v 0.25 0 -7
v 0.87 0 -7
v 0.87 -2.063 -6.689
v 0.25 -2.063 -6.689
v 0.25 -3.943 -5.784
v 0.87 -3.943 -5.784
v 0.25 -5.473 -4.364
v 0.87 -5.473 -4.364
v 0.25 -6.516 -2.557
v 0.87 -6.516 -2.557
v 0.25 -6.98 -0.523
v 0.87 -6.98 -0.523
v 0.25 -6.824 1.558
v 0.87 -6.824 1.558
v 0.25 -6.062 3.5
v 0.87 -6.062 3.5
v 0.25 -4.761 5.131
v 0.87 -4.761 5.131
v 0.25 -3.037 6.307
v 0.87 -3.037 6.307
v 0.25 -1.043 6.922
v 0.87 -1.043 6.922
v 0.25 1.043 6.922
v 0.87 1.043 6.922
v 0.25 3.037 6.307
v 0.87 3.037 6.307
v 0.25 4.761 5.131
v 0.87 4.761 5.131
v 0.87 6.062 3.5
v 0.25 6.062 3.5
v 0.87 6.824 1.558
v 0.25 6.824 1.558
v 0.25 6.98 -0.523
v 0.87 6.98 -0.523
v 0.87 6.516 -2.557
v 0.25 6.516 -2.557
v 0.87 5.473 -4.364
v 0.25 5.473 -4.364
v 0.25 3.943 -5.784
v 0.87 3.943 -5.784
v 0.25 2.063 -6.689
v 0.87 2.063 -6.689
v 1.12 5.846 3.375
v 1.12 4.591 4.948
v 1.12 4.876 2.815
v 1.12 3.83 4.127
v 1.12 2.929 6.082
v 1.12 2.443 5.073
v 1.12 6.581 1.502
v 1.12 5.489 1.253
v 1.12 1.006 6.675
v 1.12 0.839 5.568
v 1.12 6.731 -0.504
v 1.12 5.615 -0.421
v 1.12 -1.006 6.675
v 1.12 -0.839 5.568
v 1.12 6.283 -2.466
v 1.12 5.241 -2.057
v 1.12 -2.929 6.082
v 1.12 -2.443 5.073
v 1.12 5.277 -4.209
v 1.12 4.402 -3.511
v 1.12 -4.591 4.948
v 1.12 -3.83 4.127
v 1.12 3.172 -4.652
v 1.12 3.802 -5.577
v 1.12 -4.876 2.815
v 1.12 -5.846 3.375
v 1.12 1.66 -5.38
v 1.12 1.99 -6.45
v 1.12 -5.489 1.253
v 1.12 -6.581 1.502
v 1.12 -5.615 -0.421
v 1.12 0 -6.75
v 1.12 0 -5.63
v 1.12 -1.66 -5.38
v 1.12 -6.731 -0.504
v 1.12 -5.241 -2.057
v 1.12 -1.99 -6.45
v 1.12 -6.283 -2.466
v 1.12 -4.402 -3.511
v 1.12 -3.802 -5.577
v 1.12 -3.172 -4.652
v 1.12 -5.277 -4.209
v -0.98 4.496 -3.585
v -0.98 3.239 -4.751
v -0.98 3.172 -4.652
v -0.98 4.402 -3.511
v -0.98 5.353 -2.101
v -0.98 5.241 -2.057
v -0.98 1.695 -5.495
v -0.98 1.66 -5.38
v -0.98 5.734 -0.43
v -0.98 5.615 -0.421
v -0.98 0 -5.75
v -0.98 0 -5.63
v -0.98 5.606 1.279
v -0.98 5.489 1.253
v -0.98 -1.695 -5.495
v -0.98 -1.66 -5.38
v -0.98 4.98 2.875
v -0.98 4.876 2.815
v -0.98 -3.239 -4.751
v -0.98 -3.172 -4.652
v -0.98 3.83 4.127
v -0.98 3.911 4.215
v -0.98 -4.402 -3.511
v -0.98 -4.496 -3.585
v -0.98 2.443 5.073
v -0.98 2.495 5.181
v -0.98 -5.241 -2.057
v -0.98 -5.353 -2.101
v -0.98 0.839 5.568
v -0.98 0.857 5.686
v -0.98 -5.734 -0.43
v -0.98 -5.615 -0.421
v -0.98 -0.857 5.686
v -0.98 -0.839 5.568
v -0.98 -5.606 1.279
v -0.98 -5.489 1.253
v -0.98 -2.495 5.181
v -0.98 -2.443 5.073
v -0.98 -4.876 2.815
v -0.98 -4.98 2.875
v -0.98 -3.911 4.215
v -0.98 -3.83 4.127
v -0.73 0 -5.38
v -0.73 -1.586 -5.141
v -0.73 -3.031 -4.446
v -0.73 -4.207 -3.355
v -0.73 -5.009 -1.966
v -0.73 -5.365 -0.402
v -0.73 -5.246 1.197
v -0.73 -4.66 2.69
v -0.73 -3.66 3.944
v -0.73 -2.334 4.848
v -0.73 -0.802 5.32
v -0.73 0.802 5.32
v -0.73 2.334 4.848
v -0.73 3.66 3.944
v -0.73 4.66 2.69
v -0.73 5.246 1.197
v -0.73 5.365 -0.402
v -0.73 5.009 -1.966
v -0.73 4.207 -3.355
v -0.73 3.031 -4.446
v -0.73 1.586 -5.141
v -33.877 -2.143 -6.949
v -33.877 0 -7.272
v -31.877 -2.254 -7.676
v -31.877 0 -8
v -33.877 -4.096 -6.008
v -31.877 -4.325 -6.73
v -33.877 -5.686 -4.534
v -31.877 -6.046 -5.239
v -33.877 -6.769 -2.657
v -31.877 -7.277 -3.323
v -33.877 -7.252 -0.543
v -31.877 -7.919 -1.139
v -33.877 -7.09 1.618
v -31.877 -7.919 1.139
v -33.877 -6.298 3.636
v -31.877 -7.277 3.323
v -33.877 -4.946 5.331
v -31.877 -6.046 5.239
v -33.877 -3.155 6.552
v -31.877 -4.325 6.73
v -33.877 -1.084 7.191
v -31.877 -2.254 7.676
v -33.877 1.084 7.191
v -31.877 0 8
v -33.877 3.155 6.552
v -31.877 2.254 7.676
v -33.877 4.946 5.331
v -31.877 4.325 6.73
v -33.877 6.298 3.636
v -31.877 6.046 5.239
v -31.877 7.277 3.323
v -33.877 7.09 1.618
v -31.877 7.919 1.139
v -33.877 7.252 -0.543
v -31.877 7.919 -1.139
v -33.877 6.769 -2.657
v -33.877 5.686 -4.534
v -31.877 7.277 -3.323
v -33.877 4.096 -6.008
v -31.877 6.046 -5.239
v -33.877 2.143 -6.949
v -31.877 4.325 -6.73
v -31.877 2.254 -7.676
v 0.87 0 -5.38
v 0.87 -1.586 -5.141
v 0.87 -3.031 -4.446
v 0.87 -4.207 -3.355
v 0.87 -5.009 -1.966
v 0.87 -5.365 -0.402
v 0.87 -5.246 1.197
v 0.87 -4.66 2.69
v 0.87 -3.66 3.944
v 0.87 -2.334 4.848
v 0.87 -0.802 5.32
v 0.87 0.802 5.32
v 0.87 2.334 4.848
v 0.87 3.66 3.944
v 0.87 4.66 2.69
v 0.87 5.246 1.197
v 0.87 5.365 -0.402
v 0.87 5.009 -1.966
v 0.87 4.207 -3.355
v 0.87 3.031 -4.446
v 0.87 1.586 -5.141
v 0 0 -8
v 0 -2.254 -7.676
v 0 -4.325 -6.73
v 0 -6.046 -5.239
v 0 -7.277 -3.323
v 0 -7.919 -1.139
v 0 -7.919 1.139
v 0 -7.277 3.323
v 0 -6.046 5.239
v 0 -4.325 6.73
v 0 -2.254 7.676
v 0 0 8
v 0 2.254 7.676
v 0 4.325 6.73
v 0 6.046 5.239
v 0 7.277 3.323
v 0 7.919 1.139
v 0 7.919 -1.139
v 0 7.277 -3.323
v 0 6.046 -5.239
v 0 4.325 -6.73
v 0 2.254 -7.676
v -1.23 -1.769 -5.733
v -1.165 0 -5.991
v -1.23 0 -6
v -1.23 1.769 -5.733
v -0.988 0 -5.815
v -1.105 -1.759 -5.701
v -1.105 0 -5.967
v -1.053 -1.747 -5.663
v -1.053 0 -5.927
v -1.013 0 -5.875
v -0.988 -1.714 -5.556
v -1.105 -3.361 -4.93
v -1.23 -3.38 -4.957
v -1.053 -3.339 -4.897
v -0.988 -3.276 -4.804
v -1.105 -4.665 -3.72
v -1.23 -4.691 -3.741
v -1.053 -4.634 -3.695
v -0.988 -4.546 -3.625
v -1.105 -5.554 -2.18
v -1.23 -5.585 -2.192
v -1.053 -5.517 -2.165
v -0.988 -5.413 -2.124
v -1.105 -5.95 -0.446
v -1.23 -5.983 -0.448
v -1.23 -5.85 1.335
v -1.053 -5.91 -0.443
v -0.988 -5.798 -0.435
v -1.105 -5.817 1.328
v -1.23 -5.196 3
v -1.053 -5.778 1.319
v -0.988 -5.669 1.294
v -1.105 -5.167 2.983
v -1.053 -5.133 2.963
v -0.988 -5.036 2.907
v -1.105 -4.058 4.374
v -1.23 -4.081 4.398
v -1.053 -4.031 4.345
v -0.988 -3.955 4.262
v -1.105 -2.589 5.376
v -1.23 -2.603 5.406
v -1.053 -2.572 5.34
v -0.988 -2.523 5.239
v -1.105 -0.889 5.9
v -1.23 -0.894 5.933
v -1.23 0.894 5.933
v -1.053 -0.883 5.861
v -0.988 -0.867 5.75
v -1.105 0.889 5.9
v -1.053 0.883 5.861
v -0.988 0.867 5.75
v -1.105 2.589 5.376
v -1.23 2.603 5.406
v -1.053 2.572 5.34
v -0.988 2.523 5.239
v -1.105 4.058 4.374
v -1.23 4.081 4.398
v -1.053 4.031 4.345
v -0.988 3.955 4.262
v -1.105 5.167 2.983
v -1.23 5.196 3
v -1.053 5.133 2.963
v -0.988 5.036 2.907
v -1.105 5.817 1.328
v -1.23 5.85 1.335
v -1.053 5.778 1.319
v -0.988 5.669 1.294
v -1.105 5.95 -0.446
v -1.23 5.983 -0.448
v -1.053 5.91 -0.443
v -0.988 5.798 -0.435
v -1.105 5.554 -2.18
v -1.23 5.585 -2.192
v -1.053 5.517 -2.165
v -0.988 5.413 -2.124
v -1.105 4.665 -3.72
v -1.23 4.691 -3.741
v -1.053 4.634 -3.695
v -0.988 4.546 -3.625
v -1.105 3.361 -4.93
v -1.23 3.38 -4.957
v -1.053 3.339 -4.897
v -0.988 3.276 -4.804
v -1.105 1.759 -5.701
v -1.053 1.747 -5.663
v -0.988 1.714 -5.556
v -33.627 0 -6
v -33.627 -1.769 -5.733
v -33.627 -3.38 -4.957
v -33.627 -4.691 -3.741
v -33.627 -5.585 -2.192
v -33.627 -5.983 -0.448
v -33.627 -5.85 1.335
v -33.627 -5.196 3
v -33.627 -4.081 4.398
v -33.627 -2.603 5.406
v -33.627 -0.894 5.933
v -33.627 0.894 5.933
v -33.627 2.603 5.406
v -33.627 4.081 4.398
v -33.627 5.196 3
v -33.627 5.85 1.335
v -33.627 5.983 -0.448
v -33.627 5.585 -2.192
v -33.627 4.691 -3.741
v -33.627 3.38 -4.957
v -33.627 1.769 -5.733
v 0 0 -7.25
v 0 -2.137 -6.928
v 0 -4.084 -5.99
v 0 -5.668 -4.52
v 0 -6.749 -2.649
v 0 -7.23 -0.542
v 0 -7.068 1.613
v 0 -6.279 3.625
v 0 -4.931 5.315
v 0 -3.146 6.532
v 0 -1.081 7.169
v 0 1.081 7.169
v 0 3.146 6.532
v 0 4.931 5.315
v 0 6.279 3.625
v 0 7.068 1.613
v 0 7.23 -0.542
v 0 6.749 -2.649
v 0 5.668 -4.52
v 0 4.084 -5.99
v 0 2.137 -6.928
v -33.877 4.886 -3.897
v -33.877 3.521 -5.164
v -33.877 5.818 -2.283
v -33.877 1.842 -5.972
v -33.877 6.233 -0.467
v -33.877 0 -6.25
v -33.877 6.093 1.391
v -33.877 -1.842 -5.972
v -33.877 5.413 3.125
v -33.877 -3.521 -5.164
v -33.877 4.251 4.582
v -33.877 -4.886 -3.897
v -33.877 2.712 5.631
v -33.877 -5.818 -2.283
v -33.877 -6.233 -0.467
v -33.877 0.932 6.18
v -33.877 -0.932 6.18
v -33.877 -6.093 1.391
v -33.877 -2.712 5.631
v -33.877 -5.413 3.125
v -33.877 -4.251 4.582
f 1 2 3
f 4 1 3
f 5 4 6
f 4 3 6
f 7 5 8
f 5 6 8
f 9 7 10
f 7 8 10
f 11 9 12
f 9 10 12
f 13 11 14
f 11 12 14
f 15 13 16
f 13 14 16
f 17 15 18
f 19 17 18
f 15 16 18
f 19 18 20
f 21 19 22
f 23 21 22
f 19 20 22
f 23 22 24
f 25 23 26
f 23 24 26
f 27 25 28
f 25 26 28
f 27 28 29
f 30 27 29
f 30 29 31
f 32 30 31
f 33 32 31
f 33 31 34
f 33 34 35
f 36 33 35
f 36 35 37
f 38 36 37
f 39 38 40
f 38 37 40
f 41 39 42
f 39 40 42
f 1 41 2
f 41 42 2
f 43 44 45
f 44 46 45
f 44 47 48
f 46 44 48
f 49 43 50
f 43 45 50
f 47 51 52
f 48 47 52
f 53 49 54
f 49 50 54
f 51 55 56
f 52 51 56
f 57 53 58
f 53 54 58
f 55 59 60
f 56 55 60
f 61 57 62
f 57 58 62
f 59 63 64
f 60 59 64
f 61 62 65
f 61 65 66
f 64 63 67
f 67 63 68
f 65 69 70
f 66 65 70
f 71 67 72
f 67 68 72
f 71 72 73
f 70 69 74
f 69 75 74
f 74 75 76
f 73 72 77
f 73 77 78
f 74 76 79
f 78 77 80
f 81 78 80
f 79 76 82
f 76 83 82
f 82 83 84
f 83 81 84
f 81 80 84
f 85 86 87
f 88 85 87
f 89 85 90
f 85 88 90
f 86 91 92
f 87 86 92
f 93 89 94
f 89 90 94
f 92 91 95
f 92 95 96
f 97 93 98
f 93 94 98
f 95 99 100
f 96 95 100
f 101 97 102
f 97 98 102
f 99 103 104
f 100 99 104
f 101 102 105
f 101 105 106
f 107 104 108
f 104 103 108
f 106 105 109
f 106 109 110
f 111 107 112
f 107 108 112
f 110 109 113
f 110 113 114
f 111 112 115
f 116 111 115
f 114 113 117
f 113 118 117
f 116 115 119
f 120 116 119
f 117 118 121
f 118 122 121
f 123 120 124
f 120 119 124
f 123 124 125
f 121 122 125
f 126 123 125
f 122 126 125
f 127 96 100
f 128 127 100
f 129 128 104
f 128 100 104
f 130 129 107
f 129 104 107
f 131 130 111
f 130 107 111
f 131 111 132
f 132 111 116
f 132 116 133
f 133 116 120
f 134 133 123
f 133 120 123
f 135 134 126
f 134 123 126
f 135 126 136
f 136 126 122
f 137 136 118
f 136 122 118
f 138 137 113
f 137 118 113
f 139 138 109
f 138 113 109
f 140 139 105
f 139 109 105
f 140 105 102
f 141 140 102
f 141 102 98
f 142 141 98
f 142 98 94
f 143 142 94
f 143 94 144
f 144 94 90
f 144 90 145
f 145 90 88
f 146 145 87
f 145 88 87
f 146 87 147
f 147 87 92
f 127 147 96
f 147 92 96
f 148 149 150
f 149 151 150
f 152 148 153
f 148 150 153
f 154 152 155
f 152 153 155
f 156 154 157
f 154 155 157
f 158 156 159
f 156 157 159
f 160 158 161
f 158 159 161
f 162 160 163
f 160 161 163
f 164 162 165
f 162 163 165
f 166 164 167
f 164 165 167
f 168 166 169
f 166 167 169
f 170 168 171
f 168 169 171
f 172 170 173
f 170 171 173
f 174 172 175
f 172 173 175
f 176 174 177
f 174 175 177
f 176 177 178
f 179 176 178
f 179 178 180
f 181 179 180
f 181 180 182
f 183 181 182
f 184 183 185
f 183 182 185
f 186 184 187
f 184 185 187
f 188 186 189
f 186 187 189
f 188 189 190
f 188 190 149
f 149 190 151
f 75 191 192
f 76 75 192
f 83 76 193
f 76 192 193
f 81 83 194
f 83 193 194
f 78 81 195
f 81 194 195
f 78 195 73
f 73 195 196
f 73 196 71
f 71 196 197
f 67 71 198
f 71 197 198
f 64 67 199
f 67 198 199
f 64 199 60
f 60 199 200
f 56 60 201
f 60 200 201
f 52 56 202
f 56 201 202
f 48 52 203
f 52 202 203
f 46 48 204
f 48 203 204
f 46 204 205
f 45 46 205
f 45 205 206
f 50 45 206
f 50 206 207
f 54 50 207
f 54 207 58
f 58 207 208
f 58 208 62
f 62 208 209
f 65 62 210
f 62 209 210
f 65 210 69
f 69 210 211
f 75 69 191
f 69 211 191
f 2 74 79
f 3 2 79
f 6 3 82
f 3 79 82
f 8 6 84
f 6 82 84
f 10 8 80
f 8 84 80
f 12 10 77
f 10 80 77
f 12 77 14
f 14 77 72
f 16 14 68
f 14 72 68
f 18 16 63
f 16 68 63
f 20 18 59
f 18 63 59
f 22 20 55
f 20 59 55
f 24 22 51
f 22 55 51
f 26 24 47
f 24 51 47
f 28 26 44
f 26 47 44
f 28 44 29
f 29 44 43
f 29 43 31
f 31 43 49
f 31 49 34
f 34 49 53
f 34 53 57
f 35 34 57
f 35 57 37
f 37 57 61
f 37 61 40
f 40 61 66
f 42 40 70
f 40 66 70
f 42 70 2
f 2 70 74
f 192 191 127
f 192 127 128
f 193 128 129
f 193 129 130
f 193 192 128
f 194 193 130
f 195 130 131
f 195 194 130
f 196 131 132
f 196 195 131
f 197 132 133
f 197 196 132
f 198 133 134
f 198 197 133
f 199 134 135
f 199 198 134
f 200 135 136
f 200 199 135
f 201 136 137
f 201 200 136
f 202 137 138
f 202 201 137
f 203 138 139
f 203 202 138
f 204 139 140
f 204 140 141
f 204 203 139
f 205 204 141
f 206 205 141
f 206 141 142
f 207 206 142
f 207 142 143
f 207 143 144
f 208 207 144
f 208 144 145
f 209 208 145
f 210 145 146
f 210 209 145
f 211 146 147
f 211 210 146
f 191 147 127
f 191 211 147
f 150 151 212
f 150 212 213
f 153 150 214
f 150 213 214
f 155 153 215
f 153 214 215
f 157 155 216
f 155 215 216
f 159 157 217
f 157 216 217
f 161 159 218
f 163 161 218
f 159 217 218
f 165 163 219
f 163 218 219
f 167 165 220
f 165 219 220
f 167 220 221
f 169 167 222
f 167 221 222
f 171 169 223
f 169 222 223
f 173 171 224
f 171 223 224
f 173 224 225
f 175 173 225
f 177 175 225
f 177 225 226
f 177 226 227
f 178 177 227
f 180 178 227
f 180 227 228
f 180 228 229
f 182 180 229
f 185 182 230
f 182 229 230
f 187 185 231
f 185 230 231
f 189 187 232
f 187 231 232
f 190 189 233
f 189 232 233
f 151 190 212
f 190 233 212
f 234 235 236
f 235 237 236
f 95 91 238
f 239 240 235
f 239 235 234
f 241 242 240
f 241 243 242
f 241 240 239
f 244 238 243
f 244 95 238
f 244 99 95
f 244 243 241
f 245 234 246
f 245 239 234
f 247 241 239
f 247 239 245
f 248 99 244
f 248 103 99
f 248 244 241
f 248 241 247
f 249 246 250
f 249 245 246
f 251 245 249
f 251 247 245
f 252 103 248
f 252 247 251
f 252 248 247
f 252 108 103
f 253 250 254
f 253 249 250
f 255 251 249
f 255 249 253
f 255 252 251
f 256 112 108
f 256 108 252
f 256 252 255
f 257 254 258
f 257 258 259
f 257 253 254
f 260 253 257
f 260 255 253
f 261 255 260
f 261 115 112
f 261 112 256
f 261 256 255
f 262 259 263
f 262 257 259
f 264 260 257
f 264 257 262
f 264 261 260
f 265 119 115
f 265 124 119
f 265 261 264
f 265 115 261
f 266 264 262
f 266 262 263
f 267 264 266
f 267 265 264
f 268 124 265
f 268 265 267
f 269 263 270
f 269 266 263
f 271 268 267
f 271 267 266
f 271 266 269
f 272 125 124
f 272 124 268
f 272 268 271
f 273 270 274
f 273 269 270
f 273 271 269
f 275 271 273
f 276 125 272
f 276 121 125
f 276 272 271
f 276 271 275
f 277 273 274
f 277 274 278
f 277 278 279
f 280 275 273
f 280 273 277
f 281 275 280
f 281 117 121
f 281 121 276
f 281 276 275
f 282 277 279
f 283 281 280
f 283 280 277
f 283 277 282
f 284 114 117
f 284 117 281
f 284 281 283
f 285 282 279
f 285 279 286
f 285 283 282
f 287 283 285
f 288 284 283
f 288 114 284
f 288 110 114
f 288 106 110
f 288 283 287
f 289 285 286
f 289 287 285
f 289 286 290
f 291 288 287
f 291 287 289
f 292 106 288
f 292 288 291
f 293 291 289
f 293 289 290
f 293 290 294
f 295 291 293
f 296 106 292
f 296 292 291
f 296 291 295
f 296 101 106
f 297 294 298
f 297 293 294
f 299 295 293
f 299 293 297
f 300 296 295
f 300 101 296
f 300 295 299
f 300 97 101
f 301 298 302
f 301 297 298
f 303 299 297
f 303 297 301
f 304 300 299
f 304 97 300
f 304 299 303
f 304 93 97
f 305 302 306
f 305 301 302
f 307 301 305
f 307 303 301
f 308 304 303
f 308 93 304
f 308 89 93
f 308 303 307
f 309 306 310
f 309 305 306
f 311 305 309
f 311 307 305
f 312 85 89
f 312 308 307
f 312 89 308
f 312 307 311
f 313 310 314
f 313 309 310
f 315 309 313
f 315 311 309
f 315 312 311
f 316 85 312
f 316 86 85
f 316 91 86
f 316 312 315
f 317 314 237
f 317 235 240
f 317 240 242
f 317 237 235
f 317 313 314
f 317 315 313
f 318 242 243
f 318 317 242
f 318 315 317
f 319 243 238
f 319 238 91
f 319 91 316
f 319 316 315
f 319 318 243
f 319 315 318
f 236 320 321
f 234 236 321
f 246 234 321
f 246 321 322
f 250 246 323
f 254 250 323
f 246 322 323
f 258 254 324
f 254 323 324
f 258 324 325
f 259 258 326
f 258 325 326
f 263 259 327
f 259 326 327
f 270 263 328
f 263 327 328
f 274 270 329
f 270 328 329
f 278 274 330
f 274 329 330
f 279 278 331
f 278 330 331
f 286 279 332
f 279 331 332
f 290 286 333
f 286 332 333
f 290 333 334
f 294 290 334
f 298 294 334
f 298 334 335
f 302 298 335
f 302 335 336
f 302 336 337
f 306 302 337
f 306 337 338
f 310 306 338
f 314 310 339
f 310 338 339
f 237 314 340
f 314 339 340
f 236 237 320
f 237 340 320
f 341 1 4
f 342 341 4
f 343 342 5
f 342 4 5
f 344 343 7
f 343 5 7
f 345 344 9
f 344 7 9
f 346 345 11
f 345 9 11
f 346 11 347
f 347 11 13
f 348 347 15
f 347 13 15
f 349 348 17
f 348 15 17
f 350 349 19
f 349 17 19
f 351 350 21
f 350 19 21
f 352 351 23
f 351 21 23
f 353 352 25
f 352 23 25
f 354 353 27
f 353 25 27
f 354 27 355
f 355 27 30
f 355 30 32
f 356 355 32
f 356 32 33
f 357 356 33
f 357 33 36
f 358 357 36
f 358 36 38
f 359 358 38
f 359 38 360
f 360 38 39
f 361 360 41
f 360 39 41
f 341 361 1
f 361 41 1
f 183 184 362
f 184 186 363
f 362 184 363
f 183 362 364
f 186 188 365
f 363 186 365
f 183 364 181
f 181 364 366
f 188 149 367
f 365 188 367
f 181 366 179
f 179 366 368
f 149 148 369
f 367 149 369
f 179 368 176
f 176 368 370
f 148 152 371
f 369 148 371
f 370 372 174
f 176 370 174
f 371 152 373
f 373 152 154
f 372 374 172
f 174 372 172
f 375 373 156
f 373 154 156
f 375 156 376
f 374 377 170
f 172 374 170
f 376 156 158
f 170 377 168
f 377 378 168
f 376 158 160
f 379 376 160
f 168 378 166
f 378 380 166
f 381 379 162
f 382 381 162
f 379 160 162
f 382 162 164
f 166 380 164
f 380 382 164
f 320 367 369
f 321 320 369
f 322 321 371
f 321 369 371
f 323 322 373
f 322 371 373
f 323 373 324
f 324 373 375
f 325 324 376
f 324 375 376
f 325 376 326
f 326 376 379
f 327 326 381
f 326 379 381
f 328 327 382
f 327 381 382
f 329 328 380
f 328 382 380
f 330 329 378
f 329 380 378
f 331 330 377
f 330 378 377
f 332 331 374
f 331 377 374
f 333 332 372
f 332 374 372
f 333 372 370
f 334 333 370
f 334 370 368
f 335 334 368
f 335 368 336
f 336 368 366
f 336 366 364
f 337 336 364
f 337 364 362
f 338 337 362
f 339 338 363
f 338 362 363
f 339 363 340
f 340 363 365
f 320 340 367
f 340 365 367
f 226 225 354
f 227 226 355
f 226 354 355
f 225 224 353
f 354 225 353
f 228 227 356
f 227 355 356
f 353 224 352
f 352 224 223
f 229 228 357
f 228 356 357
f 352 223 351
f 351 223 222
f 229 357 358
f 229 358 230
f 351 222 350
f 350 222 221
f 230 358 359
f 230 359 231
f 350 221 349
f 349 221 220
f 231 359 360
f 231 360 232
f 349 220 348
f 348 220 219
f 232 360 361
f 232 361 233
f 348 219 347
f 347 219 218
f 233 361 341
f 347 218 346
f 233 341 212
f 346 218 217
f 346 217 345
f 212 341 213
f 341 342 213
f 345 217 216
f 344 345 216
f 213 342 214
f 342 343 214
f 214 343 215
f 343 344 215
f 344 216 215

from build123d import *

# Parameters (mm, degrees)
CHAFL_N10_SIZE = 0.25
FILLET1_R      = 0.25


with BuildPart() as part:
    # Sketch1 → Revolve1 (revolve)
    with BuildSketch(Plane.XY, mode=Mode.PRIVATE) as revolve1_sk:
        Polygon((-33.87745169, 7.272059531), (-31.87745169, 8), (0, 8), (0, 7), (1.119965147, 7), (1.119965147, 5.380453235), (0, 5.380453235), (-0.979823496, 5.380453235), (-0.979823496, 6), (-33.87745169, 6), align=None)
    revolve(revolve1_sk.sketch.rotate(Axis((0, 0, 0), (-1, 0, 0)), 90), axis=Axis((0, 0, 0), (-1, 0, 0)))

    # Chaflán10
    chafl_n10_edges = [part.edges().sort_by_distance(p)[0] for p in [
        (-33.87745169, 0, 6),
        (-0.979823496, 0, 5.380453235),
        (1.119965147, 0, 5.380453235),
        (1.119965147, 0, 7),
        (0, 0, 7),
    ]]
    chamfer(chafl_n10_edges, length=CHAFL_N10_SIZE)

    # Fillet1
    fillet1_edges = [part.edges().sort_by_distance(p)[0] for p in [
        (-0.979823496, 0, 6),
    ]]
    fillet(fillet1_edges, radius=FILLET1_R)


solid = part.part
